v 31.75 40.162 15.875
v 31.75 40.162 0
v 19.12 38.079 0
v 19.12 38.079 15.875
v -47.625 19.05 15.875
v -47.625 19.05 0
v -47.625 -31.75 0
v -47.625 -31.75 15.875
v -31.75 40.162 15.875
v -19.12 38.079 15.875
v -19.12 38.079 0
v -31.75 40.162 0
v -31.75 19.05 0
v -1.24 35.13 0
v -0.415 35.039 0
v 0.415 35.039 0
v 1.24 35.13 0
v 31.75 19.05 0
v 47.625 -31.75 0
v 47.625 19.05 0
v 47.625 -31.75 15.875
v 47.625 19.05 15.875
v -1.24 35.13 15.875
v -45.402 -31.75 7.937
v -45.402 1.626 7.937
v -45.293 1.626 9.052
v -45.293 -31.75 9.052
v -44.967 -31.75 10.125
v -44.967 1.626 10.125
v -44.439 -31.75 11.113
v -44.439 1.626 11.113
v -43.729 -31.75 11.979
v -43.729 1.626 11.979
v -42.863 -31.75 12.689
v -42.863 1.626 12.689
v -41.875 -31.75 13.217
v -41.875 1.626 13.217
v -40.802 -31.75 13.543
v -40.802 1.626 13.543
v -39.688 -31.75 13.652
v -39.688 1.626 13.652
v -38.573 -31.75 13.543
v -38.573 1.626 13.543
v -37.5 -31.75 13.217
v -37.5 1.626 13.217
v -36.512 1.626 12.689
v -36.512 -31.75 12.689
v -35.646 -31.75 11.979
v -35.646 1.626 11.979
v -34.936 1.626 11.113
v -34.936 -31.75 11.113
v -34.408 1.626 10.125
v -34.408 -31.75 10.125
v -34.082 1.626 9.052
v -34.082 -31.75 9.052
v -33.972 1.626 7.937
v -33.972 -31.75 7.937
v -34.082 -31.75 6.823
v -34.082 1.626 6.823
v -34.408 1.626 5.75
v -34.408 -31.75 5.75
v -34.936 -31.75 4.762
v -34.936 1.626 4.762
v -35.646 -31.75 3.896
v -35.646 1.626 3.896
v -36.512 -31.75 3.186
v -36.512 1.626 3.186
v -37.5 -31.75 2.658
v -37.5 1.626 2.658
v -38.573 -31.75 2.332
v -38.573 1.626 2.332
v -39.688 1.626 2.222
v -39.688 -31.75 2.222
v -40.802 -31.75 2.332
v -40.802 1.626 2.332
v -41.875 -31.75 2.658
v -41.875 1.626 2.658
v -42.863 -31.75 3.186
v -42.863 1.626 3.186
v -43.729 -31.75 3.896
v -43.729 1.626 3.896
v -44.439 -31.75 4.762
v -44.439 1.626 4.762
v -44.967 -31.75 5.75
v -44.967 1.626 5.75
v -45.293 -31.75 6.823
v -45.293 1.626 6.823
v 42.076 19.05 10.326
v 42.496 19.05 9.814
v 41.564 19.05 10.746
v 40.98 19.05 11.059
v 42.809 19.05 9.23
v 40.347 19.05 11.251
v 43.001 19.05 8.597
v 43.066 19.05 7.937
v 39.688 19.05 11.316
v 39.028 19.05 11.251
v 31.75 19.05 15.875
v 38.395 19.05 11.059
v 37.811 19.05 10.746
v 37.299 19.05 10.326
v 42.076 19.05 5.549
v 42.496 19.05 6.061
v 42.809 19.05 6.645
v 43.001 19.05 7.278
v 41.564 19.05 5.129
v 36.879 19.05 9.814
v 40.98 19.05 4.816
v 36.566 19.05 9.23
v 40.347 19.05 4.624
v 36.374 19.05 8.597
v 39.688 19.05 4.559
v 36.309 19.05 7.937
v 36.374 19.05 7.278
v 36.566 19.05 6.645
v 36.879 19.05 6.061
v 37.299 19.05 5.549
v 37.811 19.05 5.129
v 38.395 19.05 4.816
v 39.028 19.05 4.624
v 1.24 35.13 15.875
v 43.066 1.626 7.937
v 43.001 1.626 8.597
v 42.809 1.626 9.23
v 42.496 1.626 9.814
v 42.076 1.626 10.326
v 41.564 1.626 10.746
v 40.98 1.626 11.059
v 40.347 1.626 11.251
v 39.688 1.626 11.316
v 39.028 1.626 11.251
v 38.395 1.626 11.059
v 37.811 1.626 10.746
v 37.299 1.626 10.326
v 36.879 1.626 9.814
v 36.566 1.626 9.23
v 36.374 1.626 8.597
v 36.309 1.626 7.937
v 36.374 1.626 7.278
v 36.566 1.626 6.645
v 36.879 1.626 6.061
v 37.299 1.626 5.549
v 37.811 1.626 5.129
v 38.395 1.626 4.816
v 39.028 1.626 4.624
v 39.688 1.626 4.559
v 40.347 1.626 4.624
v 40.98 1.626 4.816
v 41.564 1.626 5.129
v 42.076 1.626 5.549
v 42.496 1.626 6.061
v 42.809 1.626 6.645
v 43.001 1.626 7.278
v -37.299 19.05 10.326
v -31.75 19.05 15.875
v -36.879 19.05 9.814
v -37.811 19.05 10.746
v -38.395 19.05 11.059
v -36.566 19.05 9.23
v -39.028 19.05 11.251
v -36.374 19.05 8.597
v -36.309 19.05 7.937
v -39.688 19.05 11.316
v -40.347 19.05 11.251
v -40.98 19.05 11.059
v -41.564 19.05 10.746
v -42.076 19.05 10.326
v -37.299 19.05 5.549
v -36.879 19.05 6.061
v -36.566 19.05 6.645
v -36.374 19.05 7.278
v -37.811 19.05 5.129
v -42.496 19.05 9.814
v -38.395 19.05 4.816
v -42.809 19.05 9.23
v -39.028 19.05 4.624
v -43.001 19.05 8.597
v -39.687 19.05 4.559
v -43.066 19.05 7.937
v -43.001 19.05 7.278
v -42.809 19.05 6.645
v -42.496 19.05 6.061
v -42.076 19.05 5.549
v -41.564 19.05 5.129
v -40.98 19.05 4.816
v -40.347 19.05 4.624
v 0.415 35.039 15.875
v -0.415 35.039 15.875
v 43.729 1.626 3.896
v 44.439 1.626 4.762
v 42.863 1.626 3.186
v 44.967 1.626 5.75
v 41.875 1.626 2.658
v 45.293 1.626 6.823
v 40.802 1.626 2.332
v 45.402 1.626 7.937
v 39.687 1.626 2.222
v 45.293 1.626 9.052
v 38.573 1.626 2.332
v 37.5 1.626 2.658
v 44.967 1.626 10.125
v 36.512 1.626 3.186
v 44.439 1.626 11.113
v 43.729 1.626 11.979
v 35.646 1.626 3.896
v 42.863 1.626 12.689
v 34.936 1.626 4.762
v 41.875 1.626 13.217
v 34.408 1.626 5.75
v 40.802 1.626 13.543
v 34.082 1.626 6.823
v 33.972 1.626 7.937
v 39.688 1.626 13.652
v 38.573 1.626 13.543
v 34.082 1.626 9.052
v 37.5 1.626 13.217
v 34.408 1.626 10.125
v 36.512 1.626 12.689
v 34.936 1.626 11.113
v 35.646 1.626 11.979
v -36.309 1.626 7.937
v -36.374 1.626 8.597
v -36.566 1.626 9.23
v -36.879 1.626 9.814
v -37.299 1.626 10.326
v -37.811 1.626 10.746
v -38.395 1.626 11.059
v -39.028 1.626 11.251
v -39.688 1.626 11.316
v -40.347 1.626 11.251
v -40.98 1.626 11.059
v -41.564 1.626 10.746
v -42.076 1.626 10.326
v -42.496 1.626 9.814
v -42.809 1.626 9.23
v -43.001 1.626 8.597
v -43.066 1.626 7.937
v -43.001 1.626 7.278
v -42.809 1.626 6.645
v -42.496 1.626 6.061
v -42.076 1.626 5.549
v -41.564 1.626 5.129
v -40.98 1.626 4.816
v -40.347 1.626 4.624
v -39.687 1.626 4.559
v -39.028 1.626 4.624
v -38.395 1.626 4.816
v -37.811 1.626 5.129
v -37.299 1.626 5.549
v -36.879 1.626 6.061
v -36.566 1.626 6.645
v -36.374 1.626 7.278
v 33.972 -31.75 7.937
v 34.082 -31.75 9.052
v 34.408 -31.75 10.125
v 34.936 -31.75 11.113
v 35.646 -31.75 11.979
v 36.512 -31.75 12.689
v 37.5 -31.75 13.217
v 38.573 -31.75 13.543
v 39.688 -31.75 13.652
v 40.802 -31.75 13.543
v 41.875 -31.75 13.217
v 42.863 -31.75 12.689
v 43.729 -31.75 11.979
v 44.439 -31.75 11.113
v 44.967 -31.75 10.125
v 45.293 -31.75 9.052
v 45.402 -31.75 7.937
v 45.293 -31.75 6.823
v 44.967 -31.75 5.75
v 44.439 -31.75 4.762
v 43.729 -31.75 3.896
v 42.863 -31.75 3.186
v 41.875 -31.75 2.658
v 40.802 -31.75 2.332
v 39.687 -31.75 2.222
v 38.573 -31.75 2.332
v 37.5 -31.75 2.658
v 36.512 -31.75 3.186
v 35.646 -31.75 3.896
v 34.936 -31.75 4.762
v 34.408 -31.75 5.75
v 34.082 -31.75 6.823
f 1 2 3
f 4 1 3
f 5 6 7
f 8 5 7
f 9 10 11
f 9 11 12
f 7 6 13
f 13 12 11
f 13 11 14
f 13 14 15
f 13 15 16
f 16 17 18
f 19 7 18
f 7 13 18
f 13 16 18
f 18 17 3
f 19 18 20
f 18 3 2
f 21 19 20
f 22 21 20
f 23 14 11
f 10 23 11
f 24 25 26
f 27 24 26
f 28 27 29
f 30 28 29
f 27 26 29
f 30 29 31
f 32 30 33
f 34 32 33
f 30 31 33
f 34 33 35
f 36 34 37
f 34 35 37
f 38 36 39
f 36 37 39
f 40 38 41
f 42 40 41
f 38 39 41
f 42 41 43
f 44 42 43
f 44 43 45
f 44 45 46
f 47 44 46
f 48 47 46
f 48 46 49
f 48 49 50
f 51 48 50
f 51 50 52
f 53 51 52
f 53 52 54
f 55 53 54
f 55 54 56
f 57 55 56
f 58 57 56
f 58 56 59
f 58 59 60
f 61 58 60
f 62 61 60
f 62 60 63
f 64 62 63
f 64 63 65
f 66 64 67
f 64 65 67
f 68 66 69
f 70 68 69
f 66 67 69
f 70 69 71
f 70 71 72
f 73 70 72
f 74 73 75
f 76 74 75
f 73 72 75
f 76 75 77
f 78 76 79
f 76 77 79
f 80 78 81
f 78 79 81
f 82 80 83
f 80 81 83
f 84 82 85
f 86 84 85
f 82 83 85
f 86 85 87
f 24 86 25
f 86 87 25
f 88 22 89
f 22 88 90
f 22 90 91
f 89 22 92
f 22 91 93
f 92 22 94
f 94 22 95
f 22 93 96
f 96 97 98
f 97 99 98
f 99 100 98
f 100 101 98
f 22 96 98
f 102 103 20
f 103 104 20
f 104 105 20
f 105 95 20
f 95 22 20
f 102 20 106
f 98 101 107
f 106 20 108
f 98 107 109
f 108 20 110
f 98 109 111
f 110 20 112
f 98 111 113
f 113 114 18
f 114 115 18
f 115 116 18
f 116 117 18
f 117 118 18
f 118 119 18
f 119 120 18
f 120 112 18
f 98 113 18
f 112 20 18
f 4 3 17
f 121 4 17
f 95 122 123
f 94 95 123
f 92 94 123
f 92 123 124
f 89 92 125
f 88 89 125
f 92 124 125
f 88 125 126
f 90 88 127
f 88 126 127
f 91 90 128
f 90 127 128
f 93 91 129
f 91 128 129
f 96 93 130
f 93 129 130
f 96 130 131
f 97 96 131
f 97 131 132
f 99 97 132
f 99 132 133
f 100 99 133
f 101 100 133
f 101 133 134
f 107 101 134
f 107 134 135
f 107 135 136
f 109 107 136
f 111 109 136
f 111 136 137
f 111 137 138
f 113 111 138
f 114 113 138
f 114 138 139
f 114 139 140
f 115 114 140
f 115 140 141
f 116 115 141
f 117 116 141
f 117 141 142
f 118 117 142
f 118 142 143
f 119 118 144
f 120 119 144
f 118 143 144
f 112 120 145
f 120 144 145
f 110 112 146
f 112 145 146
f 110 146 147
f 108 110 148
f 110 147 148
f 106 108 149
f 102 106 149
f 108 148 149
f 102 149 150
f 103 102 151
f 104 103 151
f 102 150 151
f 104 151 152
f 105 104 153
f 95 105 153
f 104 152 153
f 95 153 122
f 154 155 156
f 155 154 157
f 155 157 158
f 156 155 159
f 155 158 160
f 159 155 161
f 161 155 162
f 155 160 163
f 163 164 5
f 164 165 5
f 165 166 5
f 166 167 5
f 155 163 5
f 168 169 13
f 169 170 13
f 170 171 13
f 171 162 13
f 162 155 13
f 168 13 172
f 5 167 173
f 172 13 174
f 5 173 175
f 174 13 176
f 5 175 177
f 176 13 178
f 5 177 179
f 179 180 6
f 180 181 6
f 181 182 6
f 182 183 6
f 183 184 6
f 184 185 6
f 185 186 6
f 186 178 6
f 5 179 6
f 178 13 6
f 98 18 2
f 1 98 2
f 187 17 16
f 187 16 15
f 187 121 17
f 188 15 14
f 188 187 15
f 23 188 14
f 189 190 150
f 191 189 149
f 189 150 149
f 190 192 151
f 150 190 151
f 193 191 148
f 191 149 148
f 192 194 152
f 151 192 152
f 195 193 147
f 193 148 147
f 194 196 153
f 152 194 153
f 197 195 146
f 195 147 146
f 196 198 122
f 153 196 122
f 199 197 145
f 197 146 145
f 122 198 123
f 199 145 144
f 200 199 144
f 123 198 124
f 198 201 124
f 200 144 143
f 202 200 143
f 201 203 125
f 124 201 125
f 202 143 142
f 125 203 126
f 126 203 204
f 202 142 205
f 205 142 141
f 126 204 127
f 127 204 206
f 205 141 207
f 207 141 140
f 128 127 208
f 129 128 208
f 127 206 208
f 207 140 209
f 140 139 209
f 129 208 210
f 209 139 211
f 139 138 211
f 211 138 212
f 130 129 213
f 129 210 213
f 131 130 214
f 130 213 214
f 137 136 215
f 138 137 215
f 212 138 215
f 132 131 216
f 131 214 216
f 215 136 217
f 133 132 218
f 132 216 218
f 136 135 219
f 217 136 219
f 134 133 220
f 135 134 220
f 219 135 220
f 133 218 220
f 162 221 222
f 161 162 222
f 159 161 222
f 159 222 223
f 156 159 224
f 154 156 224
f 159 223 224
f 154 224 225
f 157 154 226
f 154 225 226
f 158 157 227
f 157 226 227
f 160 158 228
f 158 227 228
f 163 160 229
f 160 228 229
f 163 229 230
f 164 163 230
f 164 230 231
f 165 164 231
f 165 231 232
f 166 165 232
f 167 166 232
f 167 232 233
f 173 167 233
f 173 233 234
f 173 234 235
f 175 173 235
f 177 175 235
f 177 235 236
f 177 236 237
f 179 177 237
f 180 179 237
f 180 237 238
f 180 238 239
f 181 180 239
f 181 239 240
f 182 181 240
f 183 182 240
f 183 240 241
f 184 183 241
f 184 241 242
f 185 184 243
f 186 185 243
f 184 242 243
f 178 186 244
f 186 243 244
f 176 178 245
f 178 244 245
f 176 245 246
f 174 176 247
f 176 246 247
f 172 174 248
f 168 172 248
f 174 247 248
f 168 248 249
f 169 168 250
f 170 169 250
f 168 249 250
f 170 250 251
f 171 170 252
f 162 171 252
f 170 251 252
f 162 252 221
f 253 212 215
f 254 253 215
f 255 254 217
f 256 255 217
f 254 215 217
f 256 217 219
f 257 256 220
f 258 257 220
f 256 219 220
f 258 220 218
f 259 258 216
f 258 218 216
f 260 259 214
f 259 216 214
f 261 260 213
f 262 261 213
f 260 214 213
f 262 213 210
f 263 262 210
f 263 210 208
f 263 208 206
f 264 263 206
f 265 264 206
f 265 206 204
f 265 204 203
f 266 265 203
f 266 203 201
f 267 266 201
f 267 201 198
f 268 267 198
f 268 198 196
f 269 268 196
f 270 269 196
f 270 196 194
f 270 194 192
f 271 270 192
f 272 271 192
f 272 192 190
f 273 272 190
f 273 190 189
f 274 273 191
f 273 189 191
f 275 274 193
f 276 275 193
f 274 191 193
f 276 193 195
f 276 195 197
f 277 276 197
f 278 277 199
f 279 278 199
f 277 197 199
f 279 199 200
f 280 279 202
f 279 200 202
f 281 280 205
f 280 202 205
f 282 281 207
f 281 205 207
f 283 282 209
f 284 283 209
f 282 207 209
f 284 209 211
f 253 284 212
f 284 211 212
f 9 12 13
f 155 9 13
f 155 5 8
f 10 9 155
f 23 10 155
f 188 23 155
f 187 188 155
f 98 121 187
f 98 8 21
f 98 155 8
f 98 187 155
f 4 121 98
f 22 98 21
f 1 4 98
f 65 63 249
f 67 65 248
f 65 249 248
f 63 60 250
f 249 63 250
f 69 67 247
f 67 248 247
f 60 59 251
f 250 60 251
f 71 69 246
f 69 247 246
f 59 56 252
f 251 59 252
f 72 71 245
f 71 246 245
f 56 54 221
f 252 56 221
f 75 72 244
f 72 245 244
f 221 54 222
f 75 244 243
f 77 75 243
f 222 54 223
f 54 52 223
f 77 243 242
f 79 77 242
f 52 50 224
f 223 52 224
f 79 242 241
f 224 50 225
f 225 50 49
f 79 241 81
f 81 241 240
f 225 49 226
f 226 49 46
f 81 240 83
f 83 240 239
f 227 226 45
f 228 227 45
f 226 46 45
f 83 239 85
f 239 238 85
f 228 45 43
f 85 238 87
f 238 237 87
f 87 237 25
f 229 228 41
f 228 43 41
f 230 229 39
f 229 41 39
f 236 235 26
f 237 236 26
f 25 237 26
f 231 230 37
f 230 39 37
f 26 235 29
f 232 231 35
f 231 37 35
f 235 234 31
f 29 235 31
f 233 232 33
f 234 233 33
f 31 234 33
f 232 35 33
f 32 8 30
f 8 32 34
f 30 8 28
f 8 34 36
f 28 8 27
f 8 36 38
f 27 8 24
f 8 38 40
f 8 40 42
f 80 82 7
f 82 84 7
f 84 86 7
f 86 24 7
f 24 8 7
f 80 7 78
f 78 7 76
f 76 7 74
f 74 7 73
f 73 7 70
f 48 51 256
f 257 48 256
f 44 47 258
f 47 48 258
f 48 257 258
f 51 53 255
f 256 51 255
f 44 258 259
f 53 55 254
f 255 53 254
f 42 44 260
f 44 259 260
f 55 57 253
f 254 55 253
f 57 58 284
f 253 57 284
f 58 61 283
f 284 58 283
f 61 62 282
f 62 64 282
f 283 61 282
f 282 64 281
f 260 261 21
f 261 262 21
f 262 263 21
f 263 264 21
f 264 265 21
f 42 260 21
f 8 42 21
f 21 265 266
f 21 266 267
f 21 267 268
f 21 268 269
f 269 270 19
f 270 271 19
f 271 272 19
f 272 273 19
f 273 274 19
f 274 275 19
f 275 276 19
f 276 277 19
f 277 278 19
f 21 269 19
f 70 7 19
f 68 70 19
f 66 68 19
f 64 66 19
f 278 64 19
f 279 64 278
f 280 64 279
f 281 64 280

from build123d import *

# Parameters (mm, degrees)
BOSS_EXTRUDE1_DEPTH                = 15.875
F_1_4_CLEARANCE_HOLE1_D            = 6.7564
F_1_16_0_0625_DIAMETER_HOLE1_D     = 11.43
F_1_16_0_0625_DIAMETER_HOLE1_DEPTH = 33.3756
FILLET1_R                          = 7.62


with BuildPart() as part:
    # Sketch1 → Boss-Extrude1 (new body)
    with BuildSketch(Plane.XY):
        Polygon((31.75, 31.75), (-31.75, 31.75), (-31.75, 19.05), (-47.625, 19.05), (-47.625, -31.75), (47.625, -31.75), (47.625, 19.05), (31.75, 19.05), align=None)
        Polygon((-31.75, 40.162272173), (-31.75, 31.75), (31.75, 31.75), (31.75, 40.162272173), (19.119534727, 38.078833297), (0, 34.925), (-19.119537229, 38.07883371), align=None)
    extrude(amount=BOSS_EXTRUDE1_DEPTH)

    # 1/4 Clearance Hole1 (through all)
    with Locations(Plane(origin=(0, 19.05, 0), x_dir=(-1, 0, 0), z_dir=(0, 1, 0))):
        with Locations((39.6875, 7.9375), (-39.6875, 7.9375)):
            Hole(F_1_4_CLEARANCE_HOLE1_D / 2)

    # 1/16 (0.0625) Diameter Hole1
    with Locations(Plane.XZ.offset(31.75)):
        with Locations((39.6875, 7.9375), (-39.6875, 7.9375)):
            Hole(F_1_16_0_0625_DIAMETER_HOLE1_D / 2, depth=F_1_16_0_0625_DIAMETER_HOLE1_DEPTH)

    # Fillet1
    fillet1_edges = [part.edges().sort_by_distance(p)[0] for p in [
        (0, 34.925, 7.9375),
    ]]
    fillet(fillet1_edges, radius=FILLET1_R)


solid = part.part
